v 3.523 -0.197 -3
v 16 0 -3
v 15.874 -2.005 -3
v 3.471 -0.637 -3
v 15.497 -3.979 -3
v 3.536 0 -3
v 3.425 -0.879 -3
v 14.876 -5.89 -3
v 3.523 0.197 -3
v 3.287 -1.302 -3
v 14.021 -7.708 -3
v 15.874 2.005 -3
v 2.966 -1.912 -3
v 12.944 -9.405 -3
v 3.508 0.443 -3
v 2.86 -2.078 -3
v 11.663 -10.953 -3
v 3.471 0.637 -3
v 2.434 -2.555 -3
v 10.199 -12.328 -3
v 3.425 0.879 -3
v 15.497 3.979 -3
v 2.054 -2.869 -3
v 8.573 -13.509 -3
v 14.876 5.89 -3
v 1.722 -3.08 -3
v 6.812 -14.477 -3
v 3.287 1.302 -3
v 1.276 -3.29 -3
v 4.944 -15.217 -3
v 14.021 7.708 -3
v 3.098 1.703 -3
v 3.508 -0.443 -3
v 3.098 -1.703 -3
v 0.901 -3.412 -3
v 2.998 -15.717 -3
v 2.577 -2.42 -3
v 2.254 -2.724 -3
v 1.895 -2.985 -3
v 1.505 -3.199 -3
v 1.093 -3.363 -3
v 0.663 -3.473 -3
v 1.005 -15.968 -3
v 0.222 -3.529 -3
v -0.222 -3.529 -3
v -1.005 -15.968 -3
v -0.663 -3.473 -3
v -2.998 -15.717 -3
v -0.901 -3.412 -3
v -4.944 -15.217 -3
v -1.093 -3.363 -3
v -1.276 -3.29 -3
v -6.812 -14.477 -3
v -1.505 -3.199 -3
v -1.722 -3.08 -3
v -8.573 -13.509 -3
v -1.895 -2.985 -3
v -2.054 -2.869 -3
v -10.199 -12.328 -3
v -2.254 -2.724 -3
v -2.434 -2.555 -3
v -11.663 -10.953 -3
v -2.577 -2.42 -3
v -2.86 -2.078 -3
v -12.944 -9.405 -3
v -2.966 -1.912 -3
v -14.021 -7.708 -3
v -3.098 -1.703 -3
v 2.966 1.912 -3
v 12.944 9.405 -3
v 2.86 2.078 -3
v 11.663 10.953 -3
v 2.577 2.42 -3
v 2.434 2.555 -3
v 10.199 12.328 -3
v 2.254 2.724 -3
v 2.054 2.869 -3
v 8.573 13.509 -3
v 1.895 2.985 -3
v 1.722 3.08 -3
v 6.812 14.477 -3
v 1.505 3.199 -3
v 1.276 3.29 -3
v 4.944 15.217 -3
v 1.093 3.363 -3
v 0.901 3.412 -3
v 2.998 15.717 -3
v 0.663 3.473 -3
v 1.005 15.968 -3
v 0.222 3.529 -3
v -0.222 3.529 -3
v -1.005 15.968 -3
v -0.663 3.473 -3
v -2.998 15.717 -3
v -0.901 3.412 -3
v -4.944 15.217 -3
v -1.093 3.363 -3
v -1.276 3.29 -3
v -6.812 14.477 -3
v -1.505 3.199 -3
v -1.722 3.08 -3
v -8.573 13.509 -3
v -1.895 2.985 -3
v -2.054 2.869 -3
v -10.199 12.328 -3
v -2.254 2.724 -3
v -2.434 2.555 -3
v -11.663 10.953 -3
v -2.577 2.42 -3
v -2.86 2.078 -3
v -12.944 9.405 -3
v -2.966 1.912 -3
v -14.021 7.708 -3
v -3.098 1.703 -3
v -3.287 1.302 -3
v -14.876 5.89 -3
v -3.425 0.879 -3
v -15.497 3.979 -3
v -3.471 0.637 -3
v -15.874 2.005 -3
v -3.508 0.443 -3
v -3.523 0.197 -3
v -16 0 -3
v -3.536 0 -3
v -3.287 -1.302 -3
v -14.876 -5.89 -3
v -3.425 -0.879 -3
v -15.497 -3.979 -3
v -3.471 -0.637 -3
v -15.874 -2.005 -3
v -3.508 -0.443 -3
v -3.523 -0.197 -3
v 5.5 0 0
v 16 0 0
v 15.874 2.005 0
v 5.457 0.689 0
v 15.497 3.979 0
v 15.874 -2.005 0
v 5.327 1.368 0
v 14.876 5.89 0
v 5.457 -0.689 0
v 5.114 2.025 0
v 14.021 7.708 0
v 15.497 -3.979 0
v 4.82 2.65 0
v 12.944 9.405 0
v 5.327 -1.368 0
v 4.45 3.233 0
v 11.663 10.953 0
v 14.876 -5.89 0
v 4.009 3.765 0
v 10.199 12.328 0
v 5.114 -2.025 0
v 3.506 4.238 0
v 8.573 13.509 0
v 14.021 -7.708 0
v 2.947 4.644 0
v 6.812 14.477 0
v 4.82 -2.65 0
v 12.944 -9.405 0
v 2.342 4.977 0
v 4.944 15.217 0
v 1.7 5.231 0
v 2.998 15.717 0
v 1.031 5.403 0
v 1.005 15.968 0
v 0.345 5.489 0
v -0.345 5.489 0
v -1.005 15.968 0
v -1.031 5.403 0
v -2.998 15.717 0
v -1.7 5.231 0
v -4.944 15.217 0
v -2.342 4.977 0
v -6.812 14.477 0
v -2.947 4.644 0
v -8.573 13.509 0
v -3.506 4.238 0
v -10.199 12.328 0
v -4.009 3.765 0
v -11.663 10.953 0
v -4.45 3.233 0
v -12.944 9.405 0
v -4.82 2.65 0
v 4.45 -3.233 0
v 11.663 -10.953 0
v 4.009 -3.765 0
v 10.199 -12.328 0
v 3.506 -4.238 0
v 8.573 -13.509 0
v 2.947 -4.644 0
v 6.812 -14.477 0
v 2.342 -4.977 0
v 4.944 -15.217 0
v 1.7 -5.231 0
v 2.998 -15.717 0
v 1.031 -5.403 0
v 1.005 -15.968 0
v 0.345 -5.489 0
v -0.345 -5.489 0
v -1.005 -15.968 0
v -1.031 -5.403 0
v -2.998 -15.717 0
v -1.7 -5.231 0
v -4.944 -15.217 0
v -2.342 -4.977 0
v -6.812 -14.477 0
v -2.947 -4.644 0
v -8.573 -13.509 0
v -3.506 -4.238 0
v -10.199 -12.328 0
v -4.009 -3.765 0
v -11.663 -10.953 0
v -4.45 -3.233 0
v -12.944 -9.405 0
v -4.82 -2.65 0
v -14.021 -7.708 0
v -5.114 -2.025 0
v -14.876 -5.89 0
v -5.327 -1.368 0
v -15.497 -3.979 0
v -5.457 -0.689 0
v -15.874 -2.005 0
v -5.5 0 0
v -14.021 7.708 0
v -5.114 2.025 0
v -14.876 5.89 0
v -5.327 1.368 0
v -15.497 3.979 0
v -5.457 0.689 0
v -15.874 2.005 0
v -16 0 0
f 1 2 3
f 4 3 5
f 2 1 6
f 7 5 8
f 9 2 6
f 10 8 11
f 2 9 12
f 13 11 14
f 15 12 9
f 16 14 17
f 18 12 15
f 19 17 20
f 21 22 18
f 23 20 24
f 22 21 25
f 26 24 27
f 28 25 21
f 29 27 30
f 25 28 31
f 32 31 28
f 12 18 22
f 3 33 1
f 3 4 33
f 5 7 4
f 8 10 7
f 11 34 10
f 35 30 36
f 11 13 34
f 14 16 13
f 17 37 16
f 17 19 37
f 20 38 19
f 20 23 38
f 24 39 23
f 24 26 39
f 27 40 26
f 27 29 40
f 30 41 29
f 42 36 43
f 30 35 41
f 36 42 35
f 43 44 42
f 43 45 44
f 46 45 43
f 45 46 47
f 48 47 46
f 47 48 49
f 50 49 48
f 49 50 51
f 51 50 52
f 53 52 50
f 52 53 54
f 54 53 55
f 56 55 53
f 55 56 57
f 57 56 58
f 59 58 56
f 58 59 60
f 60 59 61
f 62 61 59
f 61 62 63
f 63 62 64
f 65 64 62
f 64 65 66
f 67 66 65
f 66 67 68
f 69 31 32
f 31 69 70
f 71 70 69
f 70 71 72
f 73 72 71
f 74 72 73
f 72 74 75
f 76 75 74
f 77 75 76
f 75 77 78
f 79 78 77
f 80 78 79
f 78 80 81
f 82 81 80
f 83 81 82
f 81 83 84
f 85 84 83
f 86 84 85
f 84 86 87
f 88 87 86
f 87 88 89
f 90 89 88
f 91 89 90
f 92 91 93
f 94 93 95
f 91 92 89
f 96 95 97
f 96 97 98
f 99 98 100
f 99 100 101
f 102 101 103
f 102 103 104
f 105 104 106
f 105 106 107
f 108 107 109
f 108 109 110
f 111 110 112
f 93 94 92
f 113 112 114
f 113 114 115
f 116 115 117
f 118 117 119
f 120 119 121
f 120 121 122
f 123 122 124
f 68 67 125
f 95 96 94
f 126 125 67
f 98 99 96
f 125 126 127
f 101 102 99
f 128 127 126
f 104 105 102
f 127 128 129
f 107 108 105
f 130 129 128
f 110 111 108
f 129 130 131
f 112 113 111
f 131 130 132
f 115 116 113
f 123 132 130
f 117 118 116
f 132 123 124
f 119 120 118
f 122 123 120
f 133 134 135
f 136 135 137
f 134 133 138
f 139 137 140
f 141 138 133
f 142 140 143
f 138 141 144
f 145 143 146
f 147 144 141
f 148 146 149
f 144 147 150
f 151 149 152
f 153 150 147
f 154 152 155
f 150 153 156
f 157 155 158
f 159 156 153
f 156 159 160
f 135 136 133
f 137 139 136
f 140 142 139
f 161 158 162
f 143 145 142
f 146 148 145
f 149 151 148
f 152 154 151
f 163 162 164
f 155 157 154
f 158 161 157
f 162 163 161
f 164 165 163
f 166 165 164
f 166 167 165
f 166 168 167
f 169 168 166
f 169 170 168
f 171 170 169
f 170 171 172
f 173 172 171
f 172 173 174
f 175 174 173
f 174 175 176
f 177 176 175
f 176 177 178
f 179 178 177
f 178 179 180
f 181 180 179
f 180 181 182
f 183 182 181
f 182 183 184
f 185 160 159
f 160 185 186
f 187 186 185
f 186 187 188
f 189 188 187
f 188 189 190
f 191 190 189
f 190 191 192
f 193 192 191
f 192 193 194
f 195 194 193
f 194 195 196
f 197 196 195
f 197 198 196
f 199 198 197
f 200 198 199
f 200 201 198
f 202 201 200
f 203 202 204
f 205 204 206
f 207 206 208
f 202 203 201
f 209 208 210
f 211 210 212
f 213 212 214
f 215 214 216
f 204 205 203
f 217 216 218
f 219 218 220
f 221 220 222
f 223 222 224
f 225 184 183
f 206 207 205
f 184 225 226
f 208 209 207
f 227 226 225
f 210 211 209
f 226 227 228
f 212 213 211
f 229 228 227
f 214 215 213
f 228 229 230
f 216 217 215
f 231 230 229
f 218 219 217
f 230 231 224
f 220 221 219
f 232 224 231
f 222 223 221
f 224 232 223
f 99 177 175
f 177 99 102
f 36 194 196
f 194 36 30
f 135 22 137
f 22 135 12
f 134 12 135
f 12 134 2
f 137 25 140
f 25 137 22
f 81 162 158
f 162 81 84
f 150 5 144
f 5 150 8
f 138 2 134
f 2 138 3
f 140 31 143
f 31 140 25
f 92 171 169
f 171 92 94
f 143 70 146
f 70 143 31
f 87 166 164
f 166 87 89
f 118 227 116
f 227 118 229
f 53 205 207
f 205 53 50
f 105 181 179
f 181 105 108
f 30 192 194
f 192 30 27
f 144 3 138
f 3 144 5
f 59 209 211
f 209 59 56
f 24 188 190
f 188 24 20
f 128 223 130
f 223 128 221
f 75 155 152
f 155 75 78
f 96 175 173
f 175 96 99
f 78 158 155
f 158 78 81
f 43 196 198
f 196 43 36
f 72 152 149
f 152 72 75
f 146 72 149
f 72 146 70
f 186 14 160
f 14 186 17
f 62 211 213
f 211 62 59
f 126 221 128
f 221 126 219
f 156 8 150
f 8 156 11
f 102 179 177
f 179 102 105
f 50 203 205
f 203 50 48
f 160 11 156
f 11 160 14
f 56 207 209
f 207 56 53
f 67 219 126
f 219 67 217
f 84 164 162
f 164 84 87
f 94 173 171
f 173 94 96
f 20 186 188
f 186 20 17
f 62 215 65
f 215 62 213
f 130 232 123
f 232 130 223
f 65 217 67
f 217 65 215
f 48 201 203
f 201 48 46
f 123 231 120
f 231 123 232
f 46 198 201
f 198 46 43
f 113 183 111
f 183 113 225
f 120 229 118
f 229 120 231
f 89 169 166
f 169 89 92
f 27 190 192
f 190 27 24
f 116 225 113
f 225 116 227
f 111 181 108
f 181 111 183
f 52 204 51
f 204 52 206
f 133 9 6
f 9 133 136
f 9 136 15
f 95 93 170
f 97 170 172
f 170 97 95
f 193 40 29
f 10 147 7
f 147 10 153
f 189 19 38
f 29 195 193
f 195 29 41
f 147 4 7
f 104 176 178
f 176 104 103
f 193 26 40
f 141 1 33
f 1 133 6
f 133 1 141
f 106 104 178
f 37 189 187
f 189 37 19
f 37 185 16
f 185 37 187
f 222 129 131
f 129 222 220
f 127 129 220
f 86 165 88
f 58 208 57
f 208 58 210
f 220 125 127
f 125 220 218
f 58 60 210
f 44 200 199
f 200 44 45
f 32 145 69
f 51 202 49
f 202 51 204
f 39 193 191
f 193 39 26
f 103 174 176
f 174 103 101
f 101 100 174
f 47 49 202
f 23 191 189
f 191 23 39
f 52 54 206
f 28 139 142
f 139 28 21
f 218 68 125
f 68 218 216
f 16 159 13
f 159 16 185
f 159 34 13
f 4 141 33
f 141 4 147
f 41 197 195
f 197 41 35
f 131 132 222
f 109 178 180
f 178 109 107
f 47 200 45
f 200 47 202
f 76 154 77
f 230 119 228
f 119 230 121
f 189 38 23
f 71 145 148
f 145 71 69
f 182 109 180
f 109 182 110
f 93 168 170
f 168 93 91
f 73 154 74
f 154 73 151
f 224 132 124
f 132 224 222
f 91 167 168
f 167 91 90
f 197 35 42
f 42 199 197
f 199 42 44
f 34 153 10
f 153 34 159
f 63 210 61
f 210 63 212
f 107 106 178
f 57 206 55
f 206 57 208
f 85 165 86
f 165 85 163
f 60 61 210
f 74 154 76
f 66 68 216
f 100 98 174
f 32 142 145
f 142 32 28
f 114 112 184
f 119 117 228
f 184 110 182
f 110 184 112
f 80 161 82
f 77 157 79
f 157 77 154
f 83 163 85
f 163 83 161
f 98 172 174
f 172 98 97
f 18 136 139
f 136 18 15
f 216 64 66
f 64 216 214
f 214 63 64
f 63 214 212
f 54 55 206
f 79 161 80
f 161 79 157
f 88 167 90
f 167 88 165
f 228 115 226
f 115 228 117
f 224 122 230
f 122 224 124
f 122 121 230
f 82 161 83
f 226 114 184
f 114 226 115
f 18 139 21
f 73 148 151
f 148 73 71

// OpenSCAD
$fn = 50;


difference() {
	union() {
		translate(v = [0, 0, -3.0000000000]) {
			cylinder(h = 3, r = 7.0000000000);
		}
		translate(v = [0, 0, -3.0000000000]) {
			cylinder(h = 3, r = 16.0000000000);
		}
	}
	union() {
		translate(v = [0, 0, 0]) {
			rotate(a = [0, 0, 0]) {
				difference() {
					union() {
						#translate(v = [0, 0, -3.0000000000]) {
							cylinder(h = 3, r = 2.2500000000);
						}
						#translate(v = [0, 0, -4.2000000000]) {
							cylinder(h = 4.2000000000, r1 = 2.7500000000, r2 = 5.5000000000);
						}
						#translate(v = [0, 0, -3.0000000000]) {
							cylinder(h = 3, r = 2.7500000000);
						}
						#translate(v = [0, 0, -3.0000000000]) {
							cylinder(h = 3, r = 2.2500000000);
						}
					}
					union();
				}
			}
		}
	}
}
